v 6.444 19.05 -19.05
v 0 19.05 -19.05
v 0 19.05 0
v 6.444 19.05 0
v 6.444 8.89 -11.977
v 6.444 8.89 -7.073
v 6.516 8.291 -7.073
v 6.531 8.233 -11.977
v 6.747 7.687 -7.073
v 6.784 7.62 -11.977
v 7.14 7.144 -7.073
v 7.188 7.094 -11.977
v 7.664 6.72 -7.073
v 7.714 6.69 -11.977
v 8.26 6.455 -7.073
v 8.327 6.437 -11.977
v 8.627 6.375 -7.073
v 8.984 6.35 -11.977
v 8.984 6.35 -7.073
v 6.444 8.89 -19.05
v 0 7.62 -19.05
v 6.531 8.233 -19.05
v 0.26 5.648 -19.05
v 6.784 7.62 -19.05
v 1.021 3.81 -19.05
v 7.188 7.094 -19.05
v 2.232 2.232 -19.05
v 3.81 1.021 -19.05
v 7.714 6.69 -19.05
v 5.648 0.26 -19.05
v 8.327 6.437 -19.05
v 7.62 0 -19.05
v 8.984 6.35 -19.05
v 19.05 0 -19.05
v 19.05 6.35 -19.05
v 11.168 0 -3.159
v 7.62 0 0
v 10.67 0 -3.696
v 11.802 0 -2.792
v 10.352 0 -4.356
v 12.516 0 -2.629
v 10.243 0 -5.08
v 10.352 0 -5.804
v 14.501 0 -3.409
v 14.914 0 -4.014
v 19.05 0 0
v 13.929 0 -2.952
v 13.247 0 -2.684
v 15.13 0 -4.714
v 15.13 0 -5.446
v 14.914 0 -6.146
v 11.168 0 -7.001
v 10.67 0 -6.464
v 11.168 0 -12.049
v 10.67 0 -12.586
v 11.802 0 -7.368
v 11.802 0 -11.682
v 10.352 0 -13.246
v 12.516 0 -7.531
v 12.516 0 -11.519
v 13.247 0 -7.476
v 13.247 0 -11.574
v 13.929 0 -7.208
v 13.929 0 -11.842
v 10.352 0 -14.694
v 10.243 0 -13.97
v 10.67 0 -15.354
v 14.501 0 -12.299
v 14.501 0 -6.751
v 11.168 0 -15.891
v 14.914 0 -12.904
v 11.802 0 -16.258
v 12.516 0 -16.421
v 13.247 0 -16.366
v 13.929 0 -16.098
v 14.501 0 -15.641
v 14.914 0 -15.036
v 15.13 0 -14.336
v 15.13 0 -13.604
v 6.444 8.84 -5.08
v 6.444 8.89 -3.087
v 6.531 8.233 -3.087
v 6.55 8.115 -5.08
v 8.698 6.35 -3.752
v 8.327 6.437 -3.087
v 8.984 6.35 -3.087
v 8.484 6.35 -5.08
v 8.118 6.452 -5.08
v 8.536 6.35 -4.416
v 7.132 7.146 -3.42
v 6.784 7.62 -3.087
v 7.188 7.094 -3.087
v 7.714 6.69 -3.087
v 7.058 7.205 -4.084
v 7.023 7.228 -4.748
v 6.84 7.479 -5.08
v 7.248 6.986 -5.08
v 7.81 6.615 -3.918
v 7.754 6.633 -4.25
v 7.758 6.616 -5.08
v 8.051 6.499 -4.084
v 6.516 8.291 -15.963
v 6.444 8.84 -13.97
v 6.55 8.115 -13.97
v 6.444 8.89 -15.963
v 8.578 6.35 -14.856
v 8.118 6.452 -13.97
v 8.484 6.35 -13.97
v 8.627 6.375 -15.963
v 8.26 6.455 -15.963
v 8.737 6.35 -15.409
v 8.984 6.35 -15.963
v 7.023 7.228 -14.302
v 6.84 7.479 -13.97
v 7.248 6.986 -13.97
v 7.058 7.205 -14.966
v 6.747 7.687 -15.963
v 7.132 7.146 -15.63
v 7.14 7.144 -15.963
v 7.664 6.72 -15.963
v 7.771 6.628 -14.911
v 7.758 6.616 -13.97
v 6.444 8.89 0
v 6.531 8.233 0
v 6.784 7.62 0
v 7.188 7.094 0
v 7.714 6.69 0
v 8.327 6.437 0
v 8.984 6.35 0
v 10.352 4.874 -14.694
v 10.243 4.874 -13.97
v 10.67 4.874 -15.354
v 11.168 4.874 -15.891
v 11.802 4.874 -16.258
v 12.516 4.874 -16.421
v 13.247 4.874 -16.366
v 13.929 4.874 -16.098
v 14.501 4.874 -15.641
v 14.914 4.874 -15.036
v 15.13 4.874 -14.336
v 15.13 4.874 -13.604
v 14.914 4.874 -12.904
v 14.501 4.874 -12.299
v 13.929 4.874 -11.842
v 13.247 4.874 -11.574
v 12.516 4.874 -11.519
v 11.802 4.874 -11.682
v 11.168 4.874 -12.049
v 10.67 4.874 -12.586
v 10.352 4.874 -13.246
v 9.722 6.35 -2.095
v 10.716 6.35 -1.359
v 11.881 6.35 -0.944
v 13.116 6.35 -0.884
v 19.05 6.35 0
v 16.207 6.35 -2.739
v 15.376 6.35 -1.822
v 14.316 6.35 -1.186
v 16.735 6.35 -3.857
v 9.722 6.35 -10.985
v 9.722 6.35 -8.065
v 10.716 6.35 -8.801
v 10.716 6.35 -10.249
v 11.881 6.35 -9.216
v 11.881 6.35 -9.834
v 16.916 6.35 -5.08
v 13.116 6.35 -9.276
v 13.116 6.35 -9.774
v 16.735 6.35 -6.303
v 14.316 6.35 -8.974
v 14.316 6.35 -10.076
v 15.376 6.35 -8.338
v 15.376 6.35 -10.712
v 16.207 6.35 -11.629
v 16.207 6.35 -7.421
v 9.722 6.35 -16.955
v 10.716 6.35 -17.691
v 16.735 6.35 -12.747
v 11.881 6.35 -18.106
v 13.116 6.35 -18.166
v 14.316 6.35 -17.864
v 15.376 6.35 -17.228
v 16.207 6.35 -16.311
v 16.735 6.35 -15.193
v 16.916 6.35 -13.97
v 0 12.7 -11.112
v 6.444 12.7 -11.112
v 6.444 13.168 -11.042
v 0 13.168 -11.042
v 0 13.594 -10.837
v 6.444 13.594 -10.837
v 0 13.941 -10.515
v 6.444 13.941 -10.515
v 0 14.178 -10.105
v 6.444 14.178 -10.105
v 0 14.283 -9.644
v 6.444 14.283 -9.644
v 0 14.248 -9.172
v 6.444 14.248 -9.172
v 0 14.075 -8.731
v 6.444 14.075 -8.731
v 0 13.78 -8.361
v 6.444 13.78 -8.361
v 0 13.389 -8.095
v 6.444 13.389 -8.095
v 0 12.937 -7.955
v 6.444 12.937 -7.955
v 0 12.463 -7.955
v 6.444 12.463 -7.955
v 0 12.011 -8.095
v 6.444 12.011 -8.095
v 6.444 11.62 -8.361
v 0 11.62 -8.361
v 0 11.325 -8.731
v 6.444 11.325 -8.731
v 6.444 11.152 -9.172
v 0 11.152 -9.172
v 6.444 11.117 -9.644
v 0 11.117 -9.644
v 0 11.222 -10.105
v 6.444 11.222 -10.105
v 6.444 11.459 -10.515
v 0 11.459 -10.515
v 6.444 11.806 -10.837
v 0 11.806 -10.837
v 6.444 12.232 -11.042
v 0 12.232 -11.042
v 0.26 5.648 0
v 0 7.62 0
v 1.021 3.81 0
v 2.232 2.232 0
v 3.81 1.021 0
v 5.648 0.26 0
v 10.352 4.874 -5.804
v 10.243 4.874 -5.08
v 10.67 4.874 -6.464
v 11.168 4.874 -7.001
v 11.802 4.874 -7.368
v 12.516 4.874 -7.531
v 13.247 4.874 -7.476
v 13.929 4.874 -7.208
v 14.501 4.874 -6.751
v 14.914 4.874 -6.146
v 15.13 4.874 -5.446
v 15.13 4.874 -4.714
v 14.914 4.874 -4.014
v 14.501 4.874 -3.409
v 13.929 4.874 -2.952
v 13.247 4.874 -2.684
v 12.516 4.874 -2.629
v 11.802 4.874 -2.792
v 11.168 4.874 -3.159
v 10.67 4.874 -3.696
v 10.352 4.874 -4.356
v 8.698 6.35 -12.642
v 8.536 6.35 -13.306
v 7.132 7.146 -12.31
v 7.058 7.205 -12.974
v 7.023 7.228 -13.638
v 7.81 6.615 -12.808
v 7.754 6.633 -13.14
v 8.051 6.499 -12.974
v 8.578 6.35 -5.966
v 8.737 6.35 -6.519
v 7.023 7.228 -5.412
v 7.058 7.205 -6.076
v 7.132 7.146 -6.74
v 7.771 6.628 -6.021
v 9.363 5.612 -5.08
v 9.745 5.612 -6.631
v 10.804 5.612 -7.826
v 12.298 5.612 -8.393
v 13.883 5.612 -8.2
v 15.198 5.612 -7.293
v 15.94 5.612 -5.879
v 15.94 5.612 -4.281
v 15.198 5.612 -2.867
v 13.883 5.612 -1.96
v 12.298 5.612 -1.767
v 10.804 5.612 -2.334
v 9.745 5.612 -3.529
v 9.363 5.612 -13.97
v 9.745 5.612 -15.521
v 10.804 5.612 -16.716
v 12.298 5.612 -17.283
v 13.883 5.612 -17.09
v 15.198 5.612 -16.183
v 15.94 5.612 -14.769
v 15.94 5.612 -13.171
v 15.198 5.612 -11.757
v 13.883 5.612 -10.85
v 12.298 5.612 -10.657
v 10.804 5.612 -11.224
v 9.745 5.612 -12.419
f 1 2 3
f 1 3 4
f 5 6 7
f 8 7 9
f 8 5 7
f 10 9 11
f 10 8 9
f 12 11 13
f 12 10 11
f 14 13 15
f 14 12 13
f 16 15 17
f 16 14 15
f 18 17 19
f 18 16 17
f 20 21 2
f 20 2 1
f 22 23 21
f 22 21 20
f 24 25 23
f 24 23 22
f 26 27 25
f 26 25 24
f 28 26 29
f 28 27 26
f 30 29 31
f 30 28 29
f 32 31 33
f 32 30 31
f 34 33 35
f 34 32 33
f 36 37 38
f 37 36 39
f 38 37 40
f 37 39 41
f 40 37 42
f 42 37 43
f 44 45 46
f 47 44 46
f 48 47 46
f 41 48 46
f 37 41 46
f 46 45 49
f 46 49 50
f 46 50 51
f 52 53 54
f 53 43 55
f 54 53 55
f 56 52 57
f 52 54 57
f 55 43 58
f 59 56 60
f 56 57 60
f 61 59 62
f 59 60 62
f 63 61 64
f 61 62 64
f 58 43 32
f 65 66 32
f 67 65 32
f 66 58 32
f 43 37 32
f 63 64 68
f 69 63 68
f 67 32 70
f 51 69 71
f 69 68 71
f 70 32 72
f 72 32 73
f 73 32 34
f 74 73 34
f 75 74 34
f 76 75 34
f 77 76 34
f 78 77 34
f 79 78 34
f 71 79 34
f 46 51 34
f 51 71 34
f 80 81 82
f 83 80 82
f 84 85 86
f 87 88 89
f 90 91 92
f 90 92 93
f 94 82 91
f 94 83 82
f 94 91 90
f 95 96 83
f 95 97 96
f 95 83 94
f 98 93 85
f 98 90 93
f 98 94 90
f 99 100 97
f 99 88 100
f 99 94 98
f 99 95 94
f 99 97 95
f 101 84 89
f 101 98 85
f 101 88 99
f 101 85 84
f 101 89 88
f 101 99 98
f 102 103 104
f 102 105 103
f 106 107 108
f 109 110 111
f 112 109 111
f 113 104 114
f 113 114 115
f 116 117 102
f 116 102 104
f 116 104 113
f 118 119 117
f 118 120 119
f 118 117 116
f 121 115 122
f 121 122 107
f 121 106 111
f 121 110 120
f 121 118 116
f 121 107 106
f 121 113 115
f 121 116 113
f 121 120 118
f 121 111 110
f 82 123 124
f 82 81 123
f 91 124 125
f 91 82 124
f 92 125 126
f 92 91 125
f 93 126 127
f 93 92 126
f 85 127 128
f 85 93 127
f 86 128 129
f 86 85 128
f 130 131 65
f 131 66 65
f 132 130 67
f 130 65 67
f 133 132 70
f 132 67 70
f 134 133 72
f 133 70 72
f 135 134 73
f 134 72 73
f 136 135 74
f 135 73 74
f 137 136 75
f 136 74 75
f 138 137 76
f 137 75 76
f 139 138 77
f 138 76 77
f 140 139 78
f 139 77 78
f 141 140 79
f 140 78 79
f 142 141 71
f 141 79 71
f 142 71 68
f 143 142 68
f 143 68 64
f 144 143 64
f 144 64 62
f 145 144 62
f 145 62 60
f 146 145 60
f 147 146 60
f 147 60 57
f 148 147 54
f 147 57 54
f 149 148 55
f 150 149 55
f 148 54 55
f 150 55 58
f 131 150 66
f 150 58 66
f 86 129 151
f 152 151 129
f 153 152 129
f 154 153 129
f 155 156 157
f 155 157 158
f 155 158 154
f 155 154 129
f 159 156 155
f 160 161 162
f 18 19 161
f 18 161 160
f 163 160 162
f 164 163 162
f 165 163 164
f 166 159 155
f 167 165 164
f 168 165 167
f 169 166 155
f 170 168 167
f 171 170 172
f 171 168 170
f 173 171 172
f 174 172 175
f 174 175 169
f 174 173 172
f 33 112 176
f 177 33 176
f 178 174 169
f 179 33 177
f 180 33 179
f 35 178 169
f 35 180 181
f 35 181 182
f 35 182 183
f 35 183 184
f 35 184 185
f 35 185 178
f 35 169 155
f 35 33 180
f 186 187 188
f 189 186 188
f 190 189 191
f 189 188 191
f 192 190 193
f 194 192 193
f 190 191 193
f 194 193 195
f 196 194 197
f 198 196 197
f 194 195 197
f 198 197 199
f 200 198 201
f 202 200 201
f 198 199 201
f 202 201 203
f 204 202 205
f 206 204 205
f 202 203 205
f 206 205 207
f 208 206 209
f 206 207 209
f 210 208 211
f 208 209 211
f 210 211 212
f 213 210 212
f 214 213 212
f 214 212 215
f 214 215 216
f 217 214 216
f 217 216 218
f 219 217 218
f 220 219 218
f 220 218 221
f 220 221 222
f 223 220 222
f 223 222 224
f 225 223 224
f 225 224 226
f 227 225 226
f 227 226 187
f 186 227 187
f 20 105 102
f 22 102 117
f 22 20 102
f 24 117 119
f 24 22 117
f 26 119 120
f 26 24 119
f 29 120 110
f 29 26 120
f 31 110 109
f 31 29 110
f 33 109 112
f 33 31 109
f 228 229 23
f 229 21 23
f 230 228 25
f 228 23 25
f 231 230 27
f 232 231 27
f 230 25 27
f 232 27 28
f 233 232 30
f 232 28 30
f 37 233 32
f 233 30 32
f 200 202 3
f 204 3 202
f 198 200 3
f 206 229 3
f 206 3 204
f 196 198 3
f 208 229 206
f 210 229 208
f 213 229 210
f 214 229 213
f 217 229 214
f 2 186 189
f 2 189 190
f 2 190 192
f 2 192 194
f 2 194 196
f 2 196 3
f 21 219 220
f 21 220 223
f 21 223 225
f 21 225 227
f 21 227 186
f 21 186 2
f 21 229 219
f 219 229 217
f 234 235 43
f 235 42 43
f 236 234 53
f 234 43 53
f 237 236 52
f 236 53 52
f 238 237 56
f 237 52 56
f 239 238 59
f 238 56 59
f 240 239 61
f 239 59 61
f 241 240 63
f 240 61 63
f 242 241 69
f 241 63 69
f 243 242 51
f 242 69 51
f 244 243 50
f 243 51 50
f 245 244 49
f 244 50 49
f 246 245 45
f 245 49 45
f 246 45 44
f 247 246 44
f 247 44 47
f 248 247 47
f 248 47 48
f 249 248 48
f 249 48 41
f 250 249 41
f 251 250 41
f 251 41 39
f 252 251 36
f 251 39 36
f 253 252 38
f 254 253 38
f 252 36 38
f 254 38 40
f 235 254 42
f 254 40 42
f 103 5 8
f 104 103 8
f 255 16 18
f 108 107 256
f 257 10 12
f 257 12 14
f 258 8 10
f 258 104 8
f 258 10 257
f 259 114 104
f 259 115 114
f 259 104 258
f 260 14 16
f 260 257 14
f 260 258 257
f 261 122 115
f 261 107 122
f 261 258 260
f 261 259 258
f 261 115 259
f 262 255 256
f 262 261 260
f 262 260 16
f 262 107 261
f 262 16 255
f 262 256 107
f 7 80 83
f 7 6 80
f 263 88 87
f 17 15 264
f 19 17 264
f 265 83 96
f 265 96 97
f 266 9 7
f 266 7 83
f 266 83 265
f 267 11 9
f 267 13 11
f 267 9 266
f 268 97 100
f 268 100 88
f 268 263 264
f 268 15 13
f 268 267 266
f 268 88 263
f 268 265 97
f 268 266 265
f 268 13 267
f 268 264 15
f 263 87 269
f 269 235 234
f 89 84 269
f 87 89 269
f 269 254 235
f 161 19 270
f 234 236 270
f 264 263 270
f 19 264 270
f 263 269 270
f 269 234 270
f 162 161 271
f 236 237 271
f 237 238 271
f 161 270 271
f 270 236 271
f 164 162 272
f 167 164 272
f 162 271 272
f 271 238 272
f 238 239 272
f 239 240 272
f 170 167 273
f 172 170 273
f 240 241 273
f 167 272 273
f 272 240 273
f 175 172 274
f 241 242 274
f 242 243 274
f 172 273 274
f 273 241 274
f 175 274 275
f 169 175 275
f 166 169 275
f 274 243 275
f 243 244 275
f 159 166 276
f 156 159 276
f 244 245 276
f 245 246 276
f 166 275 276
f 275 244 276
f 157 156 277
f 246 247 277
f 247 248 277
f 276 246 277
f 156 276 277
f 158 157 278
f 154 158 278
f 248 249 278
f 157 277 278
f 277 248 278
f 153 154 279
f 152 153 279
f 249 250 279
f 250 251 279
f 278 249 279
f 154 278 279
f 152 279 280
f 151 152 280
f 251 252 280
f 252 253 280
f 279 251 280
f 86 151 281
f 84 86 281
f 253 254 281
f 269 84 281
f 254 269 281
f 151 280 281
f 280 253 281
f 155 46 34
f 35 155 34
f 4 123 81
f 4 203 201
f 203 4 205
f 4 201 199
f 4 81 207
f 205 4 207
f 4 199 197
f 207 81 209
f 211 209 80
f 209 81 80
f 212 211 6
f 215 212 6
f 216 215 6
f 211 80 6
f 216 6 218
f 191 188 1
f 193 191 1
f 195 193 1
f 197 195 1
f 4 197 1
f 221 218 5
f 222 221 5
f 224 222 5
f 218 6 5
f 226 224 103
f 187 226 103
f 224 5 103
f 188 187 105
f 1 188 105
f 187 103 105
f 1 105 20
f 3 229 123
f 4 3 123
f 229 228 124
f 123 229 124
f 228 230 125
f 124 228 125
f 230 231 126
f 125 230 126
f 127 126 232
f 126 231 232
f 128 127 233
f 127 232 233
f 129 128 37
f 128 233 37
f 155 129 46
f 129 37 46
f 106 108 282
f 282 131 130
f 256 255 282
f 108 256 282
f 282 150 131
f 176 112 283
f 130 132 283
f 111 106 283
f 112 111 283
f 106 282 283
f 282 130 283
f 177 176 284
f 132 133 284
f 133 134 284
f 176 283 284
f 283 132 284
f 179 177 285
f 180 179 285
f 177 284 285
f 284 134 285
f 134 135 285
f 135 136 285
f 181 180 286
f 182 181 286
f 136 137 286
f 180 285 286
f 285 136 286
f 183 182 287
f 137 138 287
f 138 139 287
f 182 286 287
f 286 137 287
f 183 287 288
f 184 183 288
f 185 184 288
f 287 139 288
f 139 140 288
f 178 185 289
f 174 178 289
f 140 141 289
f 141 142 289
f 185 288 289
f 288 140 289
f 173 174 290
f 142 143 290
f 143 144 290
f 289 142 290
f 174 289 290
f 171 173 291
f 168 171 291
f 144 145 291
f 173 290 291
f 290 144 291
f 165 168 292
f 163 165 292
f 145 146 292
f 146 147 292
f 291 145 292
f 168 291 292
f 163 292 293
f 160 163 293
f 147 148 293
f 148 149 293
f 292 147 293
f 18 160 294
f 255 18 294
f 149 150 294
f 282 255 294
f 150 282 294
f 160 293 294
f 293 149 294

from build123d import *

# Parameters (mm, degrees)
SKETCH1_W                                         = 19.05
SKETCH1_H                                         = 19.05
BOSS_EXTRUDE1_DEPTH                               = 6.35
SKETCH2_W                                         = 6.444113488
SKETCH2_H                                         = 19.05
BOSS_EXTRUDE2_DEPTH                               = 12.7
CSK_FOR_8_FLAT_HEAD_MACHINE_SCREW_100_D           = 4.9149
CSK_FOR_8_FLAT_HEAD_MACHINE_SCREW_100_DEPTH       = 23.368
CSK_FOR_8_FLAT_HEAD_MACHINE_SCREW_100_CSINK_D     = 8.4328
CSK_FOR_8_FLAT_HEAD_MACHINE_SCREW_100_CSINK_ANGLE = 100
CSK_FOR_8_FLAT_HEAD_MACHINE_SCREW_100_TIP         = 1.476584928
SKETCH5_R                                         = 1.5875
CUT_EXTRUDE1_DEPTH                                = 12.7
FILLET1_R                                         = 2.54
FILLET2_R                                         = 7.62


with BuildPart() as part:
    # Sketch1 → Boss-Extrude1 (new body)
    with BuildSketch(Plane(origin=(0, 0, 0), x_dir=(1, 0, 0), z_dir=(0, 1, 0))):
        with Locations((9.525, 9.525)):
            Rectangle(SKETCH1_W, SKETCH1_H)
    extrude(amount=BOSS_EXTRUDE1_DEPTH)

    # Sketch2 → Boss-Extrude2 (add)
    with BuildSketch(Plane(origin=(0, 6.35, 0), x_dir=(1, 0, 0), z_dir=(0, 1, 0))):
        with Locations((3.222056744, 9.525)):
            Rectangle(SKETCH2_W, SKETCH2_H)
    extrude(amount=BOSS_EXTRUDE2_DEPTH)

    # CSK for #8 Flat Head Machine Screw (100)1
    with Locations(Plane(origin=(0, 6.35, 0), x_dir=(1, 0, 0), z_dir=(0, 1, 0))):
        with Locations((12.7, 13.97), (12.7, 5.08)):
            CounterSinkHole(CSK_FOR_8_FLAT_HEAD_MACHINE_SCREW_100_D / 2, CSK_FOR_8_FLAT_HEAD_MACHINE_SCREW_100_CSINK_D / 2, depth=CSK_FOR_8_FLAT_HEAD_MACHINE_SCREW_100_DEPTH, counter_sink_angle=CSK_FOR_8_FLAT_HEAD_MACHINE_SCREW_100_CSINK_ANGLE)
            with Locations((0, 0, -(CSK_FOR_8_FLAT_HEAD_MACHINE_SCREW_100_DEPTH + CSK_FOR_8_FLAT_HEAD_MACHINE_SCREW_100_TIP / 2))):  # 118° drill point
                Cone(0, CSK_FOR_8_FLAT_HEAD_MACHINE_SCREW_100_D / 2, CSK_FOR_8_FLAT_HEAD_MACHINE_SCREW_100_TIP, mode=Mode.SUBTRACT)

    # Sketch5 → Cut-Extrude1 (cut)
    with BuildSketch(Plane(origin=(6.444113488, 0, 0), x_dir=(0, 0, -1), z_dir=(1, 0, 0))):
        with Locations((9.525, 12.7)):
            Circle(SKETCH5_R)
    extrude(amount=-CUT_EXTRUDE1_DEPTH, mode=Mode.SUBTRACT)

    # Fillet1
    fillet1_edges = [part.edges().sort_by_distance(p)[0] for p in [
        (6.444113488, 6.35, -9.525),
    ]]
    fillet(fillet1_edges, radius=FILLET1_R)

    # Fillet2
    fillet2_edges = [part.edges().sort_by_distance(p)[0] for p in [
        (0, 0, -9.525),
    ]]
    fillet(fillet2_edges, radius=FILLET2_R)


solid = part.part
